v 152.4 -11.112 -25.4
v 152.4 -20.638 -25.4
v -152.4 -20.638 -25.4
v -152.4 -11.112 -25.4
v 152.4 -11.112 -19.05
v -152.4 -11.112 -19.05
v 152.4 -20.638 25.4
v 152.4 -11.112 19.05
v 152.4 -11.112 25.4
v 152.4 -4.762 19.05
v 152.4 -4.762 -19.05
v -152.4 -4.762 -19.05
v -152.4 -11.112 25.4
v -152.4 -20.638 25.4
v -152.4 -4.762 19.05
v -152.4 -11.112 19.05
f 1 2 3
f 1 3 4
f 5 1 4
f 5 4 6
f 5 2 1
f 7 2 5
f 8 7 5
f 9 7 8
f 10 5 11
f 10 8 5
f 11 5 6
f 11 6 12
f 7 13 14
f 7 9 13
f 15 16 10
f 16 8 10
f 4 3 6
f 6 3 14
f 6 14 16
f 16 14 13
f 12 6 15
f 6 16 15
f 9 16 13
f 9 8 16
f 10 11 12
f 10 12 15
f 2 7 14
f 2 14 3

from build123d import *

# Parameters (mm, degrees)
F0_W     = 6.35
F0_H     = 38.1
F1_DEPTH = 152.4


with BuildPart() as f1:
    # F0 (on Right) → F1 (new body, symmetric)
    with BuildSketch(Plane.YZ):
        Polygon((-11.1125, 25.4), (-20.6375, 25.4), (-20.6375, -25.4), (-11.1125, -25.4), (-11.1125, -19.05), (-11.1125, 19.05), align=None)
        with Locations((-7.9375, 0)):
            Rectangle(F0_W, F0_H)
    extrude(amount=F1_DEPTH, both=True)


solid = f1.part
